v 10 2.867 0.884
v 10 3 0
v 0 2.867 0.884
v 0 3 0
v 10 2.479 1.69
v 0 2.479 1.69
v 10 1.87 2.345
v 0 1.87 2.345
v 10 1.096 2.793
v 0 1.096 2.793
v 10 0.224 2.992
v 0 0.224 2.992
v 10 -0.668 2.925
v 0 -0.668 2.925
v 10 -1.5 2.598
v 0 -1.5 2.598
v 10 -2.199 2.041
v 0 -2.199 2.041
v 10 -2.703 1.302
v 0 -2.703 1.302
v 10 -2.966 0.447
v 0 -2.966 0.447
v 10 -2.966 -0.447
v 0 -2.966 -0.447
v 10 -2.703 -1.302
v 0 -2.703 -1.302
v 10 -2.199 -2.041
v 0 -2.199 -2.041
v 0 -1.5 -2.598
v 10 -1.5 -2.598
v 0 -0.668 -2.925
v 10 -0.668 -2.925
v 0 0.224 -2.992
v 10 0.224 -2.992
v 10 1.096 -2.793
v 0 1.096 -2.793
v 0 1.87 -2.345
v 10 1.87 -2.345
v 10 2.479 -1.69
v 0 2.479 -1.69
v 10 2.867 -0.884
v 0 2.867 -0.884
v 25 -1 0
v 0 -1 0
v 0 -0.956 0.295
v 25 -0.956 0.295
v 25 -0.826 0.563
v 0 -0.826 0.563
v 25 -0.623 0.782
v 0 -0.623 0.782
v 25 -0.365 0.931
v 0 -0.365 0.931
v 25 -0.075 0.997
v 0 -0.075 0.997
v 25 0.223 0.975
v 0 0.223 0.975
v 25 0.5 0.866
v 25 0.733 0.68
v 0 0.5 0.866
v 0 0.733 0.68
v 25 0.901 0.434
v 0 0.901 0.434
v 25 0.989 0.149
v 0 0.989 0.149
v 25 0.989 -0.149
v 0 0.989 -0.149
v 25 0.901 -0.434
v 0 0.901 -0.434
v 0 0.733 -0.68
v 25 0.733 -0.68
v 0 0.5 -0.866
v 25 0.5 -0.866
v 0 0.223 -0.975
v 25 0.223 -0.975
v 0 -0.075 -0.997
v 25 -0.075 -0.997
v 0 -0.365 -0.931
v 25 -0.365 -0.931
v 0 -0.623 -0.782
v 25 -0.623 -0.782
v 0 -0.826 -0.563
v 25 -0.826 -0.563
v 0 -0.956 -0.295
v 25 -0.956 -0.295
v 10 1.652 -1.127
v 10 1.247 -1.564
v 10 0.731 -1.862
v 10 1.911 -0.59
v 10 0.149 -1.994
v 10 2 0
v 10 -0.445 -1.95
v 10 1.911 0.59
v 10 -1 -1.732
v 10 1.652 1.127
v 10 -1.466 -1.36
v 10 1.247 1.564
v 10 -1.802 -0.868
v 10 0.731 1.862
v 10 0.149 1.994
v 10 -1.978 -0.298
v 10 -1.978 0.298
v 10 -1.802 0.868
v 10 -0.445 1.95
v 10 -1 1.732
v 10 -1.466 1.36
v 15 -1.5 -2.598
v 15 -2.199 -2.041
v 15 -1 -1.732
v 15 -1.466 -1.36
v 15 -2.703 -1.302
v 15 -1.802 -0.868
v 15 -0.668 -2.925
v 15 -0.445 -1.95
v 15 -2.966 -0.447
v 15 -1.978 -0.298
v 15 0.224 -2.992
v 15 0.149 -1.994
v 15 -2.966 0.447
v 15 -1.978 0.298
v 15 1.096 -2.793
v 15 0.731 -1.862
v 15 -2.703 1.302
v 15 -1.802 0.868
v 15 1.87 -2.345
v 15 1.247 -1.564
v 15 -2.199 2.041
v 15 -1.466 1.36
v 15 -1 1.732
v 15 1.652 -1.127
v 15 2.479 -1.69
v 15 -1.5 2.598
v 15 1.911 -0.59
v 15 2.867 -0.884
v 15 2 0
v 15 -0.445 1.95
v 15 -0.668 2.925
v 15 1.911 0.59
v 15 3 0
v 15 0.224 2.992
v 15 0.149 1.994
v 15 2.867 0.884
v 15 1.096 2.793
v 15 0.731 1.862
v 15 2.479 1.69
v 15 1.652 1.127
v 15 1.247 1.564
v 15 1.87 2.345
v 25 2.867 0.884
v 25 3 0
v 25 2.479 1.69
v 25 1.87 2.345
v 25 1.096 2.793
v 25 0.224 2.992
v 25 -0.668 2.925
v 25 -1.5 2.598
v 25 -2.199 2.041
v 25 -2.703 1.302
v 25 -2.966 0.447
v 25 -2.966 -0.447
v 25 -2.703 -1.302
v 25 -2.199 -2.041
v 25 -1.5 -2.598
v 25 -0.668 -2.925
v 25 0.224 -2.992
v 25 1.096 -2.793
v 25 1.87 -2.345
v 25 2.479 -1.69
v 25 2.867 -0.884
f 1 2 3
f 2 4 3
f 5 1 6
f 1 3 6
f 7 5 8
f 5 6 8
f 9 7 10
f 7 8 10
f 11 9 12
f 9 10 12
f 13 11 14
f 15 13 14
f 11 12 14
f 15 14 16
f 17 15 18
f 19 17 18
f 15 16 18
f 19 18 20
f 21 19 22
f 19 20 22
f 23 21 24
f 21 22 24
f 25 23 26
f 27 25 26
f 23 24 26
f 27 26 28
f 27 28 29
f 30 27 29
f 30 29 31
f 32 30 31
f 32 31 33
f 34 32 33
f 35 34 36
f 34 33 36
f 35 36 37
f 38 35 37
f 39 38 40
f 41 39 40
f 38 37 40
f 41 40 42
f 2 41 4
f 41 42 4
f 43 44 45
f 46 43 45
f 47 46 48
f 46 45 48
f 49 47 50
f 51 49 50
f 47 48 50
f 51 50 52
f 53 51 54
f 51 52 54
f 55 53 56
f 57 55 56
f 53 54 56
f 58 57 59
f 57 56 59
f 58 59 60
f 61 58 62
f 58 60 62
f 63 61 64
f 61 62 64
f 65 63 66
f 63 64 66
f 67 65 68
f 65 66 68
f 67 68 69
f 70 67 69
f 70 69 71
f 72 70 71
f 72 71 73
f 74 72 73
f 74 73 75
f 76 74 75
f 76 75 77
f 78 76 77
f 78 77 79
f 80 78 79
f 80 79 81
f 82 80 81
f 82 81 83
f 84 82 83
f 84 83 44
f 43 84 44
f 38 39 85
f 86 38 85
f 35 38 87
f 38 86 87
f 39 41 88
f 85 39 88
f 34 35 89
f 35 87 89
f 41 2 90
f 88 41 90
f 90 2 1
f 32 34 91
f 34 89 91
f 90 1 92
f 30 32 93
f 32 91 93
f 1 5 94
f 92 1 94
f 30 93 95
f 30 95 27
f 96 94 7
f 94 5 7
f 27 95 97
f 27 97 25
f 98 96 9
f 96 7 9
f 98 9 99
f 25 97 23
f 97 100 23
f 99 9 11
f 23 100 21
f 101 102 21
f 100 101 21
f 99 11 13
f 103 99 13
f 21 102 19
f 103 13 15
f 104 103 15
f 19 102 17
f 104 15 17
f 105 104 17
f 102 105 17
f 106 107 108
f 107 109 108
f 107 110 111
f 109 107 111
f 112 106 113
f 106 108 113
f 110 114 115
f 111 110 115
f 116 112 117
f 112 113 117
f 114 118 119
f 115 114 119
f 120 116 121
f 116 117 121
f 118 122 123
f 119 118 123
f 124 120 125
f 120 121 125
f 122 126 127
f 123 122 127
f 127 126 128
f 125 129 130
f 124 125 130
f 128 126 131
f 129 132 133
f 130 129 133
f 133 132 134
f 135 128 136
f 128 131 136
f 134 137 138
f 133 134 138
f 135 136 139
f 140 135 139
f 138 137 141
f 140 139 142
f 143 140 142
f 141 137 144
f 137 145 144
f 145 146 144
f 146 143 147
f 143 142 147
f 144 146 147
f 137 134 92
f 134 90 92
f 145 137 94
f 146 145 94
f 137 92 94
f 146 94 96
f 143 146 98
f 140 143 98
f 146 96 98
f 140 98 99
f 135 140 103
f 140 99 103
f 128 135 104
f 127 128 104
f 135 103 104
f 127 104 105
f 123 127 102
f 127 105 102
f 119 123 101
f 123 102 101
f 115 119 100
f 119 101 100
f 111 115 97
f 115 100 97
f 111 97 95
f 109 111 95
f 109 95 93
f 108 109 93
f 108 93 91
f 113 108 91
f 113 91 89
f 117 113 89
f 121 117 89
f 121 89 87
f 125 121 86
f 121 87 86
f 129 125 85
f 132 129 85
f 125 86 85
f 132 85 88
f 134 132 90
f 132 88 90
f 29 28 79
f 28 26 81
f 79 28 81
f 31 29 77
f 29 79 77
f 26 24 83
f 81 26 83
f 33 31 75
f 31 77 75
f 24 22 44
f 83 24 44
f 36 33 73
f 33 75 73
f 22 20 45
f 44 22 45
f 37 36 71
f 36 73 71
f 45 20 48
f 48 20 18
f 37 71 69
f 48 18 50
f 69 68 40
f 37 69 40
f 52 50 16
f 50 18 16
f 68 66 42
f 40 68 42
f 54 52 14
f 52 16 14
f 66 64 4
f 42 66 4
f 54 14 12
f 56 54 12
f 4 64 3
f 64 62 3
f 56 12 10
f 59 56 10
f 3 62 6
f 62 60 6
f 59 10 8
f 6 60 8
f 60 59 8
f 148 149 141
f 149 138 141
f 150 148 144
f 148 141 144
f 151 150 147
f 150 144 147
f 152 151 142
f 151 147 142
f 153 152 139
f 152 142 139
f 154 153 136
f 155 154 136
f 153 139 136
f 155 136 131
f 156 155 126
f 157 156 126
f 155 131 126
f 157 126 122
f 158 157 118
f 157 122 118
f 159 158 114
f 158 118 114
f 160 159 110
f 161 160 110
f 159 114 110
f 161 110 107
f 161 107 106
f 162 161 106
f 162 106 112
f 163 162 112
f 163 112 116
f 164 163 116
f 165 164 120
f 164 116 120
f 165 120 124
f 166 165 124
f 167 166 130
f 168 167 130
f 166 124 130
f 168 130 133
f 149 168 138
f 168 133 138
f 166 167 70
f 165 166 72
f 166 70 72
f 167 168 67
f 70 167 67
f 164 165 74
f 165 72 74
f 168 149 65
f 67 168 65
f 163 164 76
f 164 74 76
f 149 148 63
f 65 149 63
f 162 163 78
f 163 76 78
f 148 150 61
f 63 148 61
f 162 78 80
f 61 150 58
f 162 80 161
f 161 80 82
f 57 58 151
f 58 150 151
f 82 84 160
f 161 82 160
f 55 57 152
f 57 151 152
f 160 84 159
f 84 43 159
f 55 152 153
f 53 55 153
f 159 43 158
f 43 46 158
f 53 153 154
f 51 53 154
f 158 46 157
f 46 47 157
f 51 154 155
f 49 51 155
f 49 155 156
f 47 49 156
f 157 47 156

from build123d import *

# Parameters (mm, degrees)
F2_R     = 1
F3_DEPTH = 25.001


with BuildPart() as f1:
    # F0 (on Top) → F1 (revolve)
    with BuildSketch(Plane.XY):
        Polygon((0, 3), (0, 0), (25, 0), (25, 3), (15, 3), (15, 2), (10, 2), (10, 3), align=None)
    revolve(axis=Axis((12.5, 0, 0), (1, 0, 0)))

    # F2 (on face) → F3 (cut, through all)
    with BuildSketch(Plane(origin=(0, 0, 0), x_dir=(0, -1, 0), z_dir=(-1, 0, 0))):
        Circle(F2_R)
    extrude(amount=-F3_DEPTH, mode=Mode.SUBTRACT)


solid = f1.part
